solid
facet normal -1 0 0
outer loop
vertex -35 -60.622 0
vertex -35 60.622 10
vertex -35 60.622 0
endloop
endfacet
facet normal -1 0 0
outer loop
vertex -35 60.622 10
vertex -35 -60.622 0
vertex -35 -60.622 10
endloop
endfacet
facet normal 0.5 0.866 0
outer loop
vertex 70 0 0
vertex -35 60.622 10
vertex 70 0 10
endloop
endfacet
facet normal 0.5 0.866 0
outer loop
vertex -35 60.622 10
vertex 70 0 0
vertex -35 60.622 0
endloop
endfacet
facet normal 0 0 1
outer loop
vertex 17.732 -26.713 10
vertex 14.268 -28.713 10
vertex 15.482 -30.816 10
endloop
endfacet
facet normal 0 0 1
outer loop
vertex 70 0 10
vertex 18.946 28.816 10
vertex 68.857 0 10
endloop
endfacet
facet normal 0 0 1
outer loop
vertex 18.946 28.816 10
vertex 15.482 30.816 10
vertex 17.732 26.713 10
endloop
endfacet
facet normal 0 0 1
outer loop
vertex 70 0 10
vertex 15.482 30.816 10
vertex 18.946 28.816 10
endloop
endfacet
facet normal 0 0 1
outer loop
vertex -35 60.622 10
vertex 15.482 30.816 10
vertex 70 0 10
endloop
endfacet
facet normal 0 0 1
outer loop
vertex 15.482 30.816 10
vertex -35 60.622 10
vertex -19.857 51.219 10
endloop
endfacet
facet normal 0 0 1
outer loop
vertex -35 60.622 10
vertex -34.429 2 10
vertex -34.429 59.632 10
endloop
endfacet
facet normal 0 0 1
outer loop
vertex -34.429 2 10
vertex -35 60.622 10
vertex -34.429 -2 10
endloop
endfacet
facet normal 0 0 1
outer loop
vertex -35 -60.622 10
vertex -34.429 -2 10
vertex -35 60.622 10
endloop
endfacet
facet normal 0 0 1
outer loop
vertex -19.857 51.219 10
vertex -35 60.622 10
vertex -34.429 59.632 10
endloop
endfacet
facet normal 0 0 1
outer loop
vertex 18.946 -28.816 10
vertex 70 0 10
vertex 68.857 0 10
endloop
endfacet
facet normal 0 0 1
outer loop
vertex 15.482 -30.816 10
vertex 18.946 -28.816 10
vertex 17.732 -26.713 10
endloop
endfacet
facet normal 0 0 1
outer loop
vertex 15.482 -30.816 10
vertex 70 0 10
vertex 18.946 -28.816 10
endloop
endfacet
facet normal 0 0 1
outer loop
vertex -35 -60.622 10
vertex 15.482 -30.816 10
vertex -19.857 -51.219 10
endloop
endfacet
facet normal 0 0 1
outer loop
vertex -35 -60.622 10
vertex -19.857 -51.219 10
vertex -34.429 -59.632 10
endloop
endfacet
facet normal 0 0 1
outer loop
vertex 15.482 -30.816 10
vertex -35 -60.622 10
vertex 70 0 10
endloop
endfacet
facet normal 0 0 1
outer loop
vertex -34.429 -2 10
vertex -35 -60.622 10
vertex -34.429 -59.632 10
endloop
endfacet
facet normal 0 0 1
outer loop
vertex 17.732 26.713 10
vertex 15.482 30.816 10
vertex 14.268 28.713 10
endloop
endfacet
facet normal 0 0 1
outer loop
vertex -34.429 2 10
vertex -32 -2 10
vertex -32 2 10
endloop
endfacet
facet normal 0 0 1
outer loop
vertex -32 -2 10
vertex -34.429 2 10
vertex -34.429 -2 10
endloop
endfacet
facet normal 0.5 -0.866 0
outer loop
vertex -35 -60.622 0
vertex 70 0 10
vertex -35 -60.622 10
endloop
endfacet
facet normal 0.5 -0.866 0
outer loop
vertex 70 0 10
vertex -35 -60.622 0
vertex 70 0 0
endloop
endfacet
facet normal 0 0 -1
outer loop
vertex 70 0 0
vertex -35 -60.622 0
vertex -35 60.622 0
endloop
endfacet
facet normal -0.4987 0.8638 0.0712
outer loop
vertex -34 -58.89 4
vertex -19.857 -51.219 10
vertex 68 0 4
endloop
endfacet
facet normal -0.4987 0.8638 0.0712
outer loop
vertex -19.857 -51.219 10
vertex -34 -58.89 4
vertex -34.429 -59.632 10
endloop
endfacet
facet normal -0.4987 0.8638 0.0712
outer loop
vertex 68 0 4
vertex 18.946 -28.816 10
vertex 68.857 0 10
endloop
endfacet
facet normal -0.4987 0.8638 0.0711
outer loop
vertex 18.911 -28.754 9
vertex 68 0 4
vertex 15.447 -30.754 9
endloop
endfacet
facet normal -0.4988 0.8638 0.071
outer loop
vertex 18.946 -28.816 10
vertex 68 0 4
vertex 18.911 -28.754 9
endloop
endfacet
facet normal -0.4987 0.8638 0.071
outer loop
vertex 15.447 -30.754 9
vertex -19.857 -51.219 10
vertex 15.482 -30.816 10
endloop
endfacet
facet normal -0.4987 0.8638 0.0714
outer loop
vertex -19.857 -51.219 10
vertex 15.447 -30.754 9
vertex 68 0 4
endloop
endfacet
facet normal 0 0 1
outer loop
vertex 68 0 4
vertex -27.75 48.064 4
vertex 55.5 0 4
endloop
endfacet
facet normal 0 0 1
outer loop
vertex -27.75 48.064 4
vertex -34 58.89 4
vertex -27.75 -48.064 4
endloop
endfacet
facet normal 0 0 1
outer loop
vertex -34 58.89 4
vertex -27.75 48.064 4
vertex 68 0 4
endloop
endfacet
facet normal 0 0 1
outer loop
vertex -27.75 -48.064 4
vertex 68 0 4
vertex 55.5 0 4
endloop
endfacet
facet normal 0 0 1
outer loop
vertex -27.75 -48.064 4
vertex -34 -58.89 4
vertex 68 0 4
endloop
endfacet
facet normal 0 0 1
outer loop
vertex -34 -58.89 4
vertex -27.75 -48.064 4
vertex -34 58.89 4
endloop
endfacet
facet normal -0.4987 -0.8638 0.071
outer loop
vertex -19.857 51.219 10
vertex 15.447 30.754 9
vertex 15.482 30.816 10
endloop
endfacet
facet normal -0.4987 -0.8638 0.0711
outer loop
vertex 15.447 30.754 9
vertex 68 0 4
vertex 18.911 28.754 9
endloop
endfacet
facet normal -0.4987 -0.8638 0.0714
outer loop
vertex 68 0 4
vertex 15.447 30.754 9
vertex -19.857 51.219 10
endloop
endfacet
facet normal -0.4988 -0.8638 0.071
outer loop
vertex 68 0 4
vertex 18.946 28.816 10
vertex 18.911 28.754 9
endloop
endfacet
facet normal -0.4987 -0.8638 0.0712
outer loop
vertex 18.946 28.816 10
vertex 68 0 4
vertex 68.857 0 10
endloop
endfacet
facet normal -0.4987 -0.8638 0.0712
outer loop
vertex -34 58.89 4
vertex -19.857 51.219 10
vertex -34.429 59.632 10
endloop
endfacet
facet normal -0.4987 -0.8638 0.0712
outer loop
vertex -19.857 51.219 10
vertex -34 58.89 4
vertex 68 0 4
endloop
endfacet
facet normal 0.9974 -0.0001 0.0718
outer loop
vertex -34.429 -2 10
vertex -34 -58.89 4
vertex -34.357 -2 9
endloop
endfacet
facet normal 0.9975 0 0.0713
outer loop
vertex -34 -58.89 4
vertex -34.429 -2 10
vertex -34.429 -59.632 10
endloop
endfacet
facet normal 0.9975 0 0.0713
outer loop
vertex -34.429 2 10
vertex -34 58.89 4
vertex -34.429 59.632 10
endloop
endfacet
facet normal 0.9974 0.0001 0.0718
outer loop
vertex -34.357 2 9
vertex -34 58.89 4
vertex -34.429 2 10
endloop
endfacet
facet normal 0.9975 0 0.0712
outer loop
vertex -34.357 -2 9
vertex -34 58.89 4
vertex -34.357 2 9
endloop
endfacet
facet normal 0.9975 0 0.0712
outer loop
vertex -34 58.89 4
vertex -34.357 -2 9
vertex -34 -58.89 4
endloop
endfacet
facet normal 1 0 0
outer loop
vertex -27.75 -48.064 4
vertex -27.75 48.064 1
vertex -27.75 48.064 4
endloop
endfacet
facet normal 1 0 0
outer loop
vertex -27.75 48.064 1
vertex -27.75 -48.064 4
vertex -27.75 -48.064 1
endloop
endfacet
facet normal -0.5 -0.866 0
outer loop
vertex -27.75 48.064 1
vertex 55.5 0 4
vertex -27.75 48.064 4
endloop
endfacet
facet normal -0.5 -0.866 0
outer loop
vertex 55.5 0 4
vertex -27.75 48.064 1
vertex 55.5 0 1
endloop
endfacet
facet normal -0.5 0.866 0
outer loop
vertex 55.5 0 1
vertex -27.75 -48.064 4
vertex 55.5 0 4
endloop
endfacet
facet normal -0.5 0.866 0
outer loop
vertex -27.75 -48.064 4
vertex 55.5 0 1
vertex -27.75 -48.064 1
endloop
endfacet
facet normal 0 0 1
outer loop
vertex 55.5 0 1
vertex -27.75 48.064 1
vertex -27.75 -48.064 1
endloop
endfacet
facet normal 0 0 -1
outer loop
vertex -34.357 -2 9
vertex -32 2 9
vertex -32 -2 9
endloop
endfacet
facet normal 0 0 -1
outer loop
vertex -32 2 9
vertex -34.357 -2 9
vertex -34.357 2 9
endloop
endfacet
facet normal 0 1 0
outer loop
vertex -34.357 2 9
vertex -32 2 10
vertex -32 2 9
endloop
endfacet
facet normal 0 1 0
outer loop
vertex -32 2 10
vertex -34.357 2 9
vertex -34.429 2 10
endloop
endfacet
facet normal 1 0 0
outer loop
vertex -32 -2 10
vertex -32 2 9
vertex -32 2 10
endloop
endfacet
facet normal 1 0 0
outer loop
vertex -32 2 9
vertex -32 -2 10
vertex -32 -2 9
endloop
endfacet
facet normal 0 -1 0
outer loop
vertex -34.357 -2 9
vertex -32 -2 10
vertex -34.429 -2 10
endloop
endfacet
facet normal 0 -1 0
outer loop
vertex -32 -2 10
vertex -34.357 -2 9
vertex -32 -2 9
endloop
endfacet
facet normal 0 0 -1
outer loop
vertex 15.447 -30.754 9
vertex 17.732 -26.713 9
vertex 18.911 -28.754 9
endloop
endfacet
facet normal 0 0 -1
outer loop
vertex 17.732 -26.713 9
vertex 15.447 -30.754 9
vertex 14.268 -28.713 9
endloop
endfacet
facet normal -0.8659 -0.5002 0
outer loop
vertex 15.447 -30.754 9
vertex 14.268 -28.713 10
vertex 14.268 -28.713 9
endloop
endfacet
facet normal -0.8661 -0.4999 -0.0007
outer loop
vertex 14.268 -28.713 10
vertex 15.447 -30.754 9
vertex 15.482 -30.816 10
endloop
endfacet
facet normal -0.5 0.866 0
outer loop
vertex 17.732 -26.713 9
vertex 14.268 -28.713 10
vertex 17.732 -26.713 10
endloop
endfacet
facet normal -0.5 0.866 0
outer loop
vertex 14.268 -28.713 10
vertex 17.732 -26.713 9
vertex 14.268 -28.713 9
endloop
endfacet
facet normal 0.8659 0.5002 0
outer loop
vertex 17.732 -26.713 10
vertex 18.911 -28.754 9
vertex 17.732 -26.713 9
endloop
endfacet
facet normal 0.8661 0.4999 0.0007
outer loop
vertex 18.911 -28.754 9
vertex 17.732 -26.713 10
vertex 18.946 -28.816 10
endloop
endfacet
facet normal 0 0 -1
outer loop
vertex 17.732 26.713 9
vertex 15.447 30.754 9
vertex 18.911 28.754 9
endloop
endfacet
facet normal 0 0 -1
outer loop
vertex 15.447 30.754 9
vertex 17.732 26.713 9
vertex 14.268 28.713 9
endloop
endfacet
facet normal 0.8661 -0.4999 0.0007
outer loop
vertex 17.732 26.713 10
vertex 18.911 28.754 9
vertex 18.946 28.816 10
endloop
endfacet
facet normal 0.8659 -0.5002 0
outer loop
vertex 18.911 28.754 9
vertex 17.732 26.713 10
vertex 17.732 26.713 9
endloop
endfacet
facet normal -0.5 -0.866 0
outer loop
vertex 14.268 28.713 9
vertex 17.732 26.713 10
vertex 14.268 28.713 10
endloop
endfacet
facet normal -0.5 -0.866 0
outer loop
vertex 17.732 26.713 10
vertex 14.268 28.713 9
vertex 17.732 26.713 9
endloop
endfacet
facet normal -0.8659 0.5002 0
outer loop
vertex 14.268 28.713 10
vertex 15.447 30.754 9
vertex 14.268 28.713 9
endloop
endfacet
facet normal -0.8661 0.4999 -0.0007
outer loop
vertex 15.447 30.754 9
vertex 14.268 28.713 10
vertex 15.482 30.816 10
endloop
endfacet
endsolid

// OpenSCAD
$size = 70;

module base() {
 difference() {

 cylinder(h = 10,
         r1 = $size,
         r2 = $size,
         $fn = 3);
 
  translate([0,0,4]) {
    cylinder(h = 7,
         r1 = $size - 2,
         r2 = $size - 1,
         $fn = 3);
  }
  
}
}


module nib() {
  translate([-(($size/2)-1.5),0,9]) {
    linear_extrude(1) {
      square([3,4], true);
    }
  }
}
    
    
difference() {
  base();

  translate([0,0,1]) {
    cylinder(h = 7,
             r1 = $size  - 14.5,
             r2 = $size - 14.5,
             $fn = 3);
  }
 
}

nib();
rotate([0,0,120] ) {
  nib();
}
rotate([0,0,-120] ) {
  nib();
}
    
